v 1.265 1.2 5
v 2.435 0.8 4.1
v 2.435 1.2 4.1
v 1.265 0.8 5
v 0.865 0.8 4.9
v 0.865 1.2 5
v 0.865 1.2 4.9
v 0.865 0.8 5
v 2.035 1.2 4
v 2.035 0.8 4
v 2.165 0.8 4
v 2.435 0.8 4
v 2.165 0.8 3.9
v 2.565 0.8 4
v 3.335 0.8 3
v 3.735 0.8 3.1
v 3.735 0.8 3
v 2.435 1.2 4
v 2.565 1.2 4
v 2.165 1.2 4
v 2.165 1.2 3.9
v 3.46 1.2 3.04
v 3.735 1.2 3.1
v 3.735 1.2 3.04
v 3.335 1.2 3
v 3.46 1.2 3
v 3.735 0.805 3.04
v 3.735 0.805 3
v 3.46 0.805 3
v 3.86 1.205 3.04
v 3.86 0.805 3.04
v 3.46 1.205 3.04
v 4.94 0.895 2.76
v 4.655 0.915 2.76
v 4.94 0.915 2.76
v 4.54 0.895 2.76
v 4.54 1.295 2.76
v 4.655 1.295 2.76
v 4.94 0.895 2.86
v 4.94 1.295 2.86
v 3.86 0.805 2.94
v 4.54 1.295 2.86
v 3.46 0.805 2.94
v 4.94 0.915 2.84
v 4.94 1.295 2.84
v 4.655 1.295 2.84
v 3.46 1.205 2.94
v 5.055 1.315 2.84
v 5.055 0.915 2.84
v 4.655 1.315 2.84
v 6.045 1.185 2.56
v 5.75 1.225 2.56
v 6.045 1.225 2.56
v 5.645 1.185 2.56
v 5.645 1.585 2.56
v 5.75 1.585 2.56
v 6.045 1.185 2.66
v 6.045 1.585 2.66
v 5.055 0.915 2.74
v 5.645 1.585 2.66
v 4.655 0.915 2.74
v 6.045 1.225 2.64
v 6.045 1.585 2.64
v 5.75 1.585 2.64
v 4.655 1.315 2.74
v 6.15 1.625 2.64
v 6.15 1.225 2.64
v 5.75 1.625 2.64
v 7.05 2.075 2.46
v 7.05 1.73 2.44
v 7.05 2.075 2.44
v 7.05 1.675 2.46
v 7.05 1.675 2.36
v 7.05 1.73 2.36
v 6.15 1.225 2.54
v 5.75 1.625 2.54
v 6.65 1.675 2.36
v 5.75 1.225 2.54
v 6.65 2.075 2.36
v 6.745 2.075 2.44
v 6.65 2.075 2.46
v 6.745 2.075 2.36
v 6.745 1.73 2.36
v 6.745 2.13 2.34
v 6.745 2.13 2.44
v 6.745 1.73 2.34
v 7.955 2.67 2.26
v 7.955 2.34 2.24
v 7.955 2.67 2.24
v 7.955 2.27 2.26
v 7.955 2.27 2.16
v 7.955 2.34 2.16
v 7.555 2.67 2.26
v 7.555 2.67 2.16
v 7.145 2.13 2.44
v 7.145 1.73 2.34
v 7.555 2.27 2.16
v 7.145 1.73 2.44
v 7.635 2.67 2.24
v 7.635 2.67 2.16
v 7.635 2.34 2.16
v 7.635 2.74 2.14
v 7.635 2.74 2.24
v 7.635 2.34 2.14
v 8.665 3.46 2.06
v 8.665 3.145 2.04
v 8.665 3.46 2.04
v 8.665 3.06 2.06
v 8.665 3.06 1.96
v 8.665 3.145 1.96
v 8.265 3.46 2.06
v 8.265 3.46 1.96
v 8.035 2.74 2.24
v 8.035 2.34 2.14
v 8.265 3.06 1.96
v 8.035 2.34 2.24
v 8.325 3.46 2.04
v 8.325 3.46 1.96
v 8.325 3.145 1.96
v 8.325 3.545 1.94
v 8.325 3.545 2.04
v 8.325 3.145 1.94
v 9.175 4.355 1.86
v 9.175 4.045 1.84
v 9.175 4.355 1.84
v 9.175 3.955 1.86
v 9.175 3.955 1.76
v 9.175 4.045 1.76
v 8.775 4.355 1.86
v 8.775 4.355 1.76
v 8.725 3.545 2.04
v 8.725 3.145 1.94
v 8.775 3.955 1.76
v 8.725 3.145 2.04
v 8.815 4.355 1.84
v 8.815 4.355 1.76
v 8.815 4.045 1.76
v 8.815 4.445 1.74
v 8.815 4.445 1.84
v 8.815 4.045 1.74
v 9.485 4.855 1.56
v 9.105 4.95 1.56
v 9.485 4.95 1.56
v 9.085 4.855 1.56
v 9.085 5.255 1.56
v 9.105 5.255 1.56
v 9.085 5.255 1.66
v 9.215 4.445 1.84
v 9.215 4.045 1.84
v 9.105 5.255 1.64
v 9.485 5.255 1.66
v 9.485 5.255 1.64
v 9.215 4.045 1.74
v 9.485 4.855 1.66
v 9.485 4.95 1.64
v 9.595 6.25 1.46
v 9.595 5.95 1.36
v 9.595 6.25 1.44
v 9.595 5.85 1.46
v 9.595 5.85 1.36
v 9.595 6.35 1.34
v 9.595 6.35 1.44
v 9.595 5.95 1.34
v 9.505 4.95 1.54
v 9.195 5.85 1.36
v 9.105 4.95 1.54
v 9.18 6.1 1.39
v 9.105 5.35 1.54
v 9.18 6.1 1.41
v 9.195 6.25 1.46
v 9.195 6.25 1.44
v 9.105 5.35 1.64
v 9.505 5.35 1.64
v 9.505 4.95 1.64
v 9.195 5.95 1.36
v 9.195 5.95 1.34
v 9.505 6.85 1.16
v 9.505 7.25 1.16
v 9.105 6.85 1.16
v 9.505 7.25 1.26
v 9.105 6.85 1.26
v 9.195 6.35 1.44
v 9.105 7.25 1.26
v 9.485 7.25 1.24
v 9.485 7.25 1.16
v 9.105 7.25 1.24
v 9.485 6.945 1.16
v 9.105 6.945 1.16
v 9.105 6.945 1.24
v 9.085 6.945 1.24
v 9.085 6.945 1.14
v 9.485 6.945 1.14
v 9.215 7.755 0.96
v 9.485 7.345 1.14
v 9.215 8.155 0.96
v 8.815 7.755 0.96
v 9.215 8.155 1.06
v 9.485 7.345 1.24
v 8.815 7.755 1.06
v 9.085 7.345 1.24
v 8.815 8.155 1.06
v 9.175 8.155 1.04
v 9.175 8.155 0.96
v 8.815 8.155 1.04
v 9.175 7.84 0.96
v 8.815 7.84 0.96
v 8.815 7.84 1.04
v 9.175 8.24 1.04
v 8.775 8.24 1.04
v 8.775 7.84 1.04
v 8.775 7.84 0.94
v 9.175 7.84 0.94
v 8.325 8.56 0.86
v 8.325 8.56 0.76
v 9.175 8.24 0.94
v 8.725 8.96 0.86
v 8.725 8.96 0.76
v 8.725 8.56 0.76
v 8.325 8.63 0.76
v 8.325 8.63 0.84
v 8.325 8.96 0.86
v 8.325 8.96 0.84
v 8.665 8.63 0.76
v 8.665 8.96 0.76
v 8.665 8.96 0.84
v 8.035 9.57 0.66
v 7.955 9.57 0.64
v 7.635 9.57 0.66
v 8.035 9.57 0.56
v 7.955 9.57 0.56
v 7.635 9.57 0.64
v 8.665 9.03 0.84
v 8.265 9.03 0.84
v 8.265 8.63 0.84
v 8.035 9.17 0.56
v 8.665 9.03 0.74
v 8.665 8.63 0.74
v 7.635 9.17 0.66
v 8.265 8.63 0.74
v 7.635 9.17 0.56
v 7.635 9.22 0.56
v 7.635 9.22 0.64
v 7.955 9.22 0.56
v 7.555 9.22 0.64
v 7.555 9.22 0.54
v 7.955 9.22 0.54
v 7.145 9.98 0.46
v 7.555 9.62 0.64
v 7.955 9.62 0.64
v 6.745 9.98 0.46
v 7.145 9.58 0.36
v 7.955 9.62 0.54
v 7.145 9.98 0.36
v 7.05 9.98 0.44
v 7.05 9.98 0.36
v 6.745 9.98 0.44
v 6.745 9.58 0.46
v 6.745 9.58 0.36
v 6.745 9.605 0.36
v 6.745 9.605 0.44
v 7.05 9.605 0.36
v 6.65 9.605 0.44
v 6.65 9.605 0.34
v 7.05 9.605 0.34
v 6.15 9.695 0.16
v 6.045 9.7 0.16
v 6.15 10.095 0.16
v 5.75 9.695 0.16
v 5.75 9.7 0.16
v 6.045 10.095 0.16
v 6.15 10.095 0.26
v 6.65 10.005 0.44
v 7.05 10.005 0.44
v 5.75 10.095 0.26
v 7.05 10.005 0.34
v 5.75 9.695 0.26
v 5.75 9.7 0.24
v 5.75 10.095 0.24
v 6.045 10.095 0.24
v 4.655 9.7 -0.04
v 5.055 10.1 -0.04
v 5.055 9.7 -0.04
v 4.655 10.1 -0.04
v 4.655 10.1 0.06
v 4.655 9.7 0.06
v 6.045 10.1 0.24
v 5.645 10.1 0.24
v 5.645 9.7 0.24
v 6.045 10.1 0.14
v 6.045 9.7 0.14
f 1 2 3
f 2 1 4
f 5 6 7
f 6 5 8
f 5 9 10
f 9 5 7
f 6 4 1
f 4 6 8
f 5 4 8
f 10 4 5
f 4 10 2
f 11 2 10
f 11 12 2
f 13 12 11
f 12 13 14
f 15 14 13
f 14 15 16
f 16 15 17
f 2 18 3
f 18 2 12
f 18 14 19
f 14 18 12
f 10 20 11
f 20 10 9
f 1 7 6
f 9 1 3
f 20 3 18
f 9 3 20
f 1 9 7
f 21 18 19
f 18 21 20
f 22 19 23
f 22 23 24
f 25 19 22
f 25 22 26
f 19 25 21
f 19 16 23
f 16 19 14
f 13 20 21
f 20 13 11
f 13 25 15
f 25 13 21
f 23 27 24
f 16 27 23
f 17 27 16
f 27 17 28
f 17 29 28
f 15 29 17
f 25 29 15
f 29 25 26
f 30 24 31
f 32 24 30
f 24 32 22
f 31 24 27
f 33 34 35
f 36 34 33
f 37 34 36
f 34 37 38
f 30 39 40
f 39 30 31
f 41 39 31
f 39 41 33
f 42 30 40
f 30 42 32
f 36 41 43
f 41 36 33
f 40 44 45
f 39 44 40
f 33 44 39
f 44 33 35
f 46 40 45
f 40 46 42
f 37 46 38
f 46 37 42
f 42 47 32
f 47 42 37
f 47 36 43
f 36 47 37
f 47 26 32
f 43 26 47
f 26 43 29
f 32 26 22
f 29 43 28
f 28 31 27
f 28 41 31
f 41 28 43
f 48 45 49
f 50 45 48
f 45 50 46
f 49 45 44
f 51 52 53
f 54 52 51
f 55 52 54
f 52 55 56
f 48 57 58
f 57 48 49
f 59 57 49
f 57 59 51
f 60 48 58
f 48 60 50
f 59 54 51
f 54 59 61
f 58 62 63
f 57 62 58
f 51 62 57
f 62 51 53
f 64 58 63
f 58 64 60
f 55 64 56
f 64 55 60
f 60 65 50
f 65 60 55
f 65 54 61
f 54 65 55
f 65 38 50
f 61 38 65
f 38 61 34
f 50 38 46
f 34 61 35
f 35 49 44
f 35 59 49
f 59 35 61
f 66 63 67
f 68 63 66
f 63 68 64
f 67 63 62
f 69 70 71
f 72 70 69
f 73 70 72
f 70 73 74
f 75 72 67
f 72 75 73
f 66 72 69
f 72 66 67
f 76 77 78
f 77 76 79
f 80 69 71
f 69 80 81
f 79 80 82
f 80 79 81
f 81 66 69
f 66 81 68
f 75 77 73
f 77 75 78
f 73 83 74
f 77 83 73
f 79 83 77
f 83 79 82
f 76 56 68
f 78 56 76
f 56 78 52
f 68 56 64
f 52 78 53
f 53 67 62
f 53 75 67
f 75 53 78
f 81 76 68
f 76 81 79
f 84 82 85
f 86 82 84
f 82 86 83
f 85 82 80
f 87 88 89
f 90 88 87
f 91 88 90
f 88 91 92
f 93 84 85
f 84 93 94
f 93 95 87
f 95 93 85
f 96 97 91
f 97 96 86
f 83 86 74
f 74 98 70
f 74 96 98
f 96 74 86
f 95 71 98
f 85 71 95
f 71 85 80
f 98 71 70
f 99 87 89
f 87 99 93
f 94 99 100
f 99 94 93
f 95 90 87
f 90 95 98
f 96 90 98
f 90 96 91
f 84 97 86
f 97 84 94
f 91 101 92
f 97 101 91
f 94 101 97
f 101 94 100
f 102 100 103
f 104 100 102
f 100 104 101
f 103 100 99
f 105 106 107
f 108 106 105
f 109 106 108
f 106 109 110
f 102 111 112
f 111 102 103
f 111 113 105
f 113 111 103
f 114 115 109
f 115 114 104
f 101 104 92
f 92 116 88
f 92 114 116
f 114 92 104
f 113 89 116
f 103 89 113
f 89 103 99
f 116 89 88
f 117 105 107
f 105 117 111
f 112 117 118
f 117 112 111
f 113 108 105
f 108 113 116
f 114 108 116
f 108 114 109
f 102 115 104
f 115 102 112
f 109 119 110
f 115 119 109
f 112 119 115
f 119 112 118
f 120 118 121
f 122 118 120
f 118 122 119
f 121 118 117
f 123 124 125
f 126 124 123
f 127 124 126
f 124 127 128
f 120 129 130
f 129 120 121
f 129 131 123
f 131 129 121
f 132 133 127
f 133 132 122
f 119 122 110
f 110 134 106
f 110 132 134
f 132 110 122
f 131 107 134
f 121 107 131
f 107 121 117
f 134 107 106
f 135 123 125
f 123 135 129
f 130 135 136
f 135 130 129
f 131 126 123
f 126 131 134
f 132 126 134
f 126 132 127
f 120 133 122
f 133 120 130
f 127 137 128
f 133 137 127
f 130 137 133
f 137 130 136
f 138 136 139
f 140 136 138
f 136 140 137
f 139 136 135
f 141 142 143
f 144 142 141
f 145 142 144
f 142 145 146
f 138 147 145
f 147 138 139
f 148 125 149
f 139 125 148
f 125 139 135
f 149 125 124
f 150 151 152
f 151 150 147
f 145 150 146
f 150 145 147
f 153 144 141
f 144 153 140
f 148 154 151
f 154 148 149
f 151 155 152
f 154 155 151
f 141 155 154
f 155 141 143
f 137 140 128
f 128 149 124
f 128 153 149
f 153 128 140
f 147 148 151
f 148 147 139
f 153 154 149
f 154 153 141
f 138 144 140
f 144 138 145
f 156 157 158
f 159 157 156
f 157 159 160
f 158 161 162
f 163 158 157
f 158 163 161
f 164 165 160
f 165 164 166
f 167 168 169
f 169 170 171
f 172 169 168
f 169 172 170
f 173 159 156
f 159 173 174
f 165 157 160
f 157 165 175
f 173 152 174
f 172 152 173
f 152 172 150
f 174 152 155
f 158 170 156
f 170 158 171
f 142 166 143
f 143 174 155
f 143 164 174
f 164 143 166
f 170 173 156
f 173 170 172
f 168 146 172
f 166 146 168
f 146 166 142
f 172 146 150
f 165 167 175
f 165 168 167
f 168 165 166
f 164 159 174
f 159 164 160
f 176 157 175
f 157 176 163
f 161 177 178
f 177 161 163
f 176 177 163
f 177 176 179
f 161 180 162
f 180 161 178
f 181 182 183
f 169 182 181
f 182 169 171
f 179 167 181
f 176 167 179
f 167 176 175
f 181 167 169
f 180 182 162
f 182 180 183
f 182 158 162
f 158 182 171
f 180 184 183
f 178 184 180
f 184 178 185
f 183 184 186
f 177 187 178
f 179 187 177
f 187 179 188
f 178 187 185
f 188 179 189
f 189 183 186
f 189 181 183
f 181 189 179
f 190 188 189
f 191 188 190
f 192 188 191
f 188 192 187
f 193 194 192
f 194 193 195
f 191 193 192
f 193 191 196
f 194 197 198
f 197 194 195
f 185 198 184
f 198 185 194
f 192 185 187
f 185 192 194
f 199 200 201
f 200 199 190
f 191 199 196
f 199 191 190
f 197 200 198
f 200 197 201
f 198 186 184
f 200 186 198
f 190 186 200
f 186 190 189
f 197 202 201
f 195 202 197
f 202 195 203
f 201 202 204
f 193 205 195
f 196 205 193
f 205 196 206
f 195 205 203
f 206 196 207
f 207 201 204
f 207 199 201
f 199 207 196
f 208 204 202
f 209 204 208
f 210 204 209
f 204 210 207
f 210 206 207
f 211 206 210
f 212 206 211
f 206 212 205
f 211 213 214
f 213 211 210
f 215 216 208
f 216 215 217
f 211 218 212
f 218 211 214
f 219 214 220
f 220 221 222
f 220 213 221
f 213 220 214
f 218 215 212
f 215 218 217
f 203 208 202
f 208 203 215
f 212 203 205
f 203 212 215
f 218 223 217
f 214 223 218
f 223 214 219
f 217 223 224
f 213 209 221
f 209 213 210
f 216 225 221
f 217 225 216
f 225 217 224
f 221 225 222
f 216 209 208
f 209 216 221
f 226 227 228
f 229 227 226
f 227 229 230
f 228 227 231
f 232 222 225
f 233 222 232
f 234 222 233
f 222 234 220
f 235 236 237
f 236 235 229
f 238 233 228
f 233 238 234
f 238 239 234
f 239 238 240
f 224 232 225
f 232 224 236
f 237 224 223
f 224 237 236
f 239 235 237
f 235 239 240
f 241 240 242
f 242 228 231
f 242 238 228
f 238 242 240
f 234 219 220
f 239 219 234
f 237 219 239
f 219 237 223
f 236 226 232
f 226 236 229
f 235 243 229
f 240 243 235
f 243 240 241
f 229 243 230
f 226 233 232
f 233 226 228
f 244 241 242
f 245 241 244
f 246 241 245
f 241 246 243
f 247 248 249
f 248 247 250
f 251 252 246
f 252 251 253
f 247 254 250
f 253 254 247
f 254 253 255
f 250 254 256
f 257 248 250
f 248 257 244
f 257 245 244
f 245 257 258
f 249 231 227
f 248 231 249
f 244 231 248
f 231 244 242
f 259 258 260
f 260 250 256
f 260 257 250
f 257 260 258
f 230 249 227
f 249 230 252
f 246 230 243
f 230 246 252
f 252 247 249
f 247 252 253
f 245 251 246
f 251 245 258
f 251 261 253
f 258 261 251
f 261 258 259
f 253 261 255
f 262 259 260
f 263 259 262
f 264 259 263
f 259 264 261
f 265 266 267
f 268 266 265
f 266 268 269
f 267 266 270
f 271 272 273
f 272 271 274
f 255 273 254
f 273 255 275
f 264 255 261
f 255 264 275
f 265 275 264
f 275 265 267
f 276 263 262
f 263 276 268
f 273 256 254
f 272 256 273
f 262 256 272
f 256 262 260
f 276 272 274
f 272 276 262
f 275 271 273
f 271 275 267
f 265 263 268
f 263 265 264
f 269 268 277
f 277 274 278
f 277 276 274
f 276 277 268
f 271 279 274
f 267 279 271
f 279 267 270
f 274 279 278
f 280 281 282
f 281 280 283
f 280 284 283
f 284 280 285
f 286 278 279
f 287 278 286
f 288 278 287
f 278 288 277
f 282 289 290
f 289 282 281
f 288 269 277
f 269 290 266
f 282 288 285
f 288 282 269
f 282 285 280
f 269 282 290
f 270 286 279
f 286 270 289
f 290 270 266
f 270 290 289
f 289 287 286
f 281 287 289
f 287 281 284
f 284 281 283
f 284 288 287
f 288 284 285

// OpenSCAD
hull() {
    translate([1.065, 1.0, 4.95]) cube([0.4, 0.4, 0.1], center=true);
    translate([2.235, 1.0, 4.05]) cube([0.4, 0.4, 0.1], center=true);
}


hull() {
    translate([2.3649999999999998, 1.0, 3.95]) cube([0.4, 0.4, 0.1], center=true);
    translate([3.535, 1.0, 3.0500000000000003]) cube([0.4, 0.4, 0.1], center=true);
}


hull() {
    translate([3.66, 1.0050000000000001, 2.99]) cube([0.4, 0.4, 0.1], center=true);
    translate([4.74, 1.0950000000000002, 2.81]) cube([0.4, 0.4, 0.1], center=true);
}


hull() {
    translate([4.855, 1.1150000000000002, 2.79]) cube([0.4, 0.4, 0.1], center=true);
    translate([5.845000000000001, 1.385, 2.6100000000000003]) cube([0.4, 0.4, 0.1], center=true);
}


hull() {
    translate([5.950000000000001, 1.425, 2.5900000000000003]) cube([0.4, 0.4, 0.1], center=true);
    translate([6.850000000000001, 1.875, 2.41]) cube([0.4, 0.4, 0.1], center=true);
}


hull() {
    translate([6.945000000000001, 1.93, 2.39]) cube([0.4, 0.4, 0.1], center=true);
    translate([7.755, 2.47, 2.21]) cube([0.4, 0.4, 0.1], center=true);
}


hull() {
    translate([7.835, 2.54, 2.1900000000000004]) cube([0.4, 0.4, 0.1], center=true);
    translate([8.465, 3.26, 2.0100000000000002]) cube([0.4, 0.4, 0.1], center=true);
}


hull() {
    translate([8.525, 3.3449999999999998, 1.99]) cube([0.4, 0.4, 0.1], center=true);
    translate([8.975, 4.155, 1.81]) cube([0.4, 0.4, 0.1], center=true);
}


hull() {
    translate([9.015, 4.245, 1.79]) cube([0.4, 0.4, 0.1], center=true);
    translate([9.285, 5.055, 1.6100000000000003]) cube([0.4, 0.4, 0.1], center=true);
}


hull() {
    translate([9.305000000000001, 5.1499999999999995, 1.5900000000000003]) cube([0.4, 0.4, 0.1], center=true);
    translate([9.395000000000001, 6.05, 1.4100000000000001]) cube([0.4, 0.4, 0.1], center=true);
}


hull() {
    translate([9.395000000000001, 6.15, 1.39]) cube([0.4, 0.4, 0.1], center=true);
    translate([9.305000000000001, 7.05, 1.21]) cube([0.4, 0.4, 0.1], center=true);
}


hull() {
    translate([9.285, 7.145, 1.1900000000000002]) cube([0.4, 0.4, 0.1], center=true);
    translate([9.015, 7.955, 1.01]) cube([0.4, 0.4, 0.1], center=true);
}


hull() {
    translate([8.975, 8.040000000000001, 0.99]) cube([0.4, 0.4, 0.1], center=true);
    translate([8.525, 8.760000000000002, 0.81]) cube([0.4, 0.4, 0.1], center=true);
}


hull() {
    translate([8.465, 8.830000000000002, 0.79]) cube([0.4, 0.4, 0.1], center=true);
    translate([7.835, 9.370000000000001, 0.61]) cube([0.4, 0.4, 0.1], center=true);
}


hull() {
    translate([7.755, 9.420000000000002, 0.5900000000000001]) cube([0.4, 0.4, 0.1], center=true);
    translate([6.945000000000001, 9.780000000000001, 0.41000000000000003]) cube([0.4, 0.4, 0.1], center=true);
}


hull() {
    translate([6.850000000000001, 9.805, 0.39000000000000007]) cube([0.4, 0.4, 0.1], center=true);
    translate([5.950000000000001, 9.895, 0.21000000000000002]) cube([0.4, 0.4, 0.1], center=true);
}


hull() {
    translate([5.845000000000001, 9.9, 0.19000000000000003]) cube([0.4, 0.4, 0.1], center=true);
    translate([4.855, 9.9, 0.010000000000000002]) cube([0.4, 0.4, 0.1], center=true);
}
